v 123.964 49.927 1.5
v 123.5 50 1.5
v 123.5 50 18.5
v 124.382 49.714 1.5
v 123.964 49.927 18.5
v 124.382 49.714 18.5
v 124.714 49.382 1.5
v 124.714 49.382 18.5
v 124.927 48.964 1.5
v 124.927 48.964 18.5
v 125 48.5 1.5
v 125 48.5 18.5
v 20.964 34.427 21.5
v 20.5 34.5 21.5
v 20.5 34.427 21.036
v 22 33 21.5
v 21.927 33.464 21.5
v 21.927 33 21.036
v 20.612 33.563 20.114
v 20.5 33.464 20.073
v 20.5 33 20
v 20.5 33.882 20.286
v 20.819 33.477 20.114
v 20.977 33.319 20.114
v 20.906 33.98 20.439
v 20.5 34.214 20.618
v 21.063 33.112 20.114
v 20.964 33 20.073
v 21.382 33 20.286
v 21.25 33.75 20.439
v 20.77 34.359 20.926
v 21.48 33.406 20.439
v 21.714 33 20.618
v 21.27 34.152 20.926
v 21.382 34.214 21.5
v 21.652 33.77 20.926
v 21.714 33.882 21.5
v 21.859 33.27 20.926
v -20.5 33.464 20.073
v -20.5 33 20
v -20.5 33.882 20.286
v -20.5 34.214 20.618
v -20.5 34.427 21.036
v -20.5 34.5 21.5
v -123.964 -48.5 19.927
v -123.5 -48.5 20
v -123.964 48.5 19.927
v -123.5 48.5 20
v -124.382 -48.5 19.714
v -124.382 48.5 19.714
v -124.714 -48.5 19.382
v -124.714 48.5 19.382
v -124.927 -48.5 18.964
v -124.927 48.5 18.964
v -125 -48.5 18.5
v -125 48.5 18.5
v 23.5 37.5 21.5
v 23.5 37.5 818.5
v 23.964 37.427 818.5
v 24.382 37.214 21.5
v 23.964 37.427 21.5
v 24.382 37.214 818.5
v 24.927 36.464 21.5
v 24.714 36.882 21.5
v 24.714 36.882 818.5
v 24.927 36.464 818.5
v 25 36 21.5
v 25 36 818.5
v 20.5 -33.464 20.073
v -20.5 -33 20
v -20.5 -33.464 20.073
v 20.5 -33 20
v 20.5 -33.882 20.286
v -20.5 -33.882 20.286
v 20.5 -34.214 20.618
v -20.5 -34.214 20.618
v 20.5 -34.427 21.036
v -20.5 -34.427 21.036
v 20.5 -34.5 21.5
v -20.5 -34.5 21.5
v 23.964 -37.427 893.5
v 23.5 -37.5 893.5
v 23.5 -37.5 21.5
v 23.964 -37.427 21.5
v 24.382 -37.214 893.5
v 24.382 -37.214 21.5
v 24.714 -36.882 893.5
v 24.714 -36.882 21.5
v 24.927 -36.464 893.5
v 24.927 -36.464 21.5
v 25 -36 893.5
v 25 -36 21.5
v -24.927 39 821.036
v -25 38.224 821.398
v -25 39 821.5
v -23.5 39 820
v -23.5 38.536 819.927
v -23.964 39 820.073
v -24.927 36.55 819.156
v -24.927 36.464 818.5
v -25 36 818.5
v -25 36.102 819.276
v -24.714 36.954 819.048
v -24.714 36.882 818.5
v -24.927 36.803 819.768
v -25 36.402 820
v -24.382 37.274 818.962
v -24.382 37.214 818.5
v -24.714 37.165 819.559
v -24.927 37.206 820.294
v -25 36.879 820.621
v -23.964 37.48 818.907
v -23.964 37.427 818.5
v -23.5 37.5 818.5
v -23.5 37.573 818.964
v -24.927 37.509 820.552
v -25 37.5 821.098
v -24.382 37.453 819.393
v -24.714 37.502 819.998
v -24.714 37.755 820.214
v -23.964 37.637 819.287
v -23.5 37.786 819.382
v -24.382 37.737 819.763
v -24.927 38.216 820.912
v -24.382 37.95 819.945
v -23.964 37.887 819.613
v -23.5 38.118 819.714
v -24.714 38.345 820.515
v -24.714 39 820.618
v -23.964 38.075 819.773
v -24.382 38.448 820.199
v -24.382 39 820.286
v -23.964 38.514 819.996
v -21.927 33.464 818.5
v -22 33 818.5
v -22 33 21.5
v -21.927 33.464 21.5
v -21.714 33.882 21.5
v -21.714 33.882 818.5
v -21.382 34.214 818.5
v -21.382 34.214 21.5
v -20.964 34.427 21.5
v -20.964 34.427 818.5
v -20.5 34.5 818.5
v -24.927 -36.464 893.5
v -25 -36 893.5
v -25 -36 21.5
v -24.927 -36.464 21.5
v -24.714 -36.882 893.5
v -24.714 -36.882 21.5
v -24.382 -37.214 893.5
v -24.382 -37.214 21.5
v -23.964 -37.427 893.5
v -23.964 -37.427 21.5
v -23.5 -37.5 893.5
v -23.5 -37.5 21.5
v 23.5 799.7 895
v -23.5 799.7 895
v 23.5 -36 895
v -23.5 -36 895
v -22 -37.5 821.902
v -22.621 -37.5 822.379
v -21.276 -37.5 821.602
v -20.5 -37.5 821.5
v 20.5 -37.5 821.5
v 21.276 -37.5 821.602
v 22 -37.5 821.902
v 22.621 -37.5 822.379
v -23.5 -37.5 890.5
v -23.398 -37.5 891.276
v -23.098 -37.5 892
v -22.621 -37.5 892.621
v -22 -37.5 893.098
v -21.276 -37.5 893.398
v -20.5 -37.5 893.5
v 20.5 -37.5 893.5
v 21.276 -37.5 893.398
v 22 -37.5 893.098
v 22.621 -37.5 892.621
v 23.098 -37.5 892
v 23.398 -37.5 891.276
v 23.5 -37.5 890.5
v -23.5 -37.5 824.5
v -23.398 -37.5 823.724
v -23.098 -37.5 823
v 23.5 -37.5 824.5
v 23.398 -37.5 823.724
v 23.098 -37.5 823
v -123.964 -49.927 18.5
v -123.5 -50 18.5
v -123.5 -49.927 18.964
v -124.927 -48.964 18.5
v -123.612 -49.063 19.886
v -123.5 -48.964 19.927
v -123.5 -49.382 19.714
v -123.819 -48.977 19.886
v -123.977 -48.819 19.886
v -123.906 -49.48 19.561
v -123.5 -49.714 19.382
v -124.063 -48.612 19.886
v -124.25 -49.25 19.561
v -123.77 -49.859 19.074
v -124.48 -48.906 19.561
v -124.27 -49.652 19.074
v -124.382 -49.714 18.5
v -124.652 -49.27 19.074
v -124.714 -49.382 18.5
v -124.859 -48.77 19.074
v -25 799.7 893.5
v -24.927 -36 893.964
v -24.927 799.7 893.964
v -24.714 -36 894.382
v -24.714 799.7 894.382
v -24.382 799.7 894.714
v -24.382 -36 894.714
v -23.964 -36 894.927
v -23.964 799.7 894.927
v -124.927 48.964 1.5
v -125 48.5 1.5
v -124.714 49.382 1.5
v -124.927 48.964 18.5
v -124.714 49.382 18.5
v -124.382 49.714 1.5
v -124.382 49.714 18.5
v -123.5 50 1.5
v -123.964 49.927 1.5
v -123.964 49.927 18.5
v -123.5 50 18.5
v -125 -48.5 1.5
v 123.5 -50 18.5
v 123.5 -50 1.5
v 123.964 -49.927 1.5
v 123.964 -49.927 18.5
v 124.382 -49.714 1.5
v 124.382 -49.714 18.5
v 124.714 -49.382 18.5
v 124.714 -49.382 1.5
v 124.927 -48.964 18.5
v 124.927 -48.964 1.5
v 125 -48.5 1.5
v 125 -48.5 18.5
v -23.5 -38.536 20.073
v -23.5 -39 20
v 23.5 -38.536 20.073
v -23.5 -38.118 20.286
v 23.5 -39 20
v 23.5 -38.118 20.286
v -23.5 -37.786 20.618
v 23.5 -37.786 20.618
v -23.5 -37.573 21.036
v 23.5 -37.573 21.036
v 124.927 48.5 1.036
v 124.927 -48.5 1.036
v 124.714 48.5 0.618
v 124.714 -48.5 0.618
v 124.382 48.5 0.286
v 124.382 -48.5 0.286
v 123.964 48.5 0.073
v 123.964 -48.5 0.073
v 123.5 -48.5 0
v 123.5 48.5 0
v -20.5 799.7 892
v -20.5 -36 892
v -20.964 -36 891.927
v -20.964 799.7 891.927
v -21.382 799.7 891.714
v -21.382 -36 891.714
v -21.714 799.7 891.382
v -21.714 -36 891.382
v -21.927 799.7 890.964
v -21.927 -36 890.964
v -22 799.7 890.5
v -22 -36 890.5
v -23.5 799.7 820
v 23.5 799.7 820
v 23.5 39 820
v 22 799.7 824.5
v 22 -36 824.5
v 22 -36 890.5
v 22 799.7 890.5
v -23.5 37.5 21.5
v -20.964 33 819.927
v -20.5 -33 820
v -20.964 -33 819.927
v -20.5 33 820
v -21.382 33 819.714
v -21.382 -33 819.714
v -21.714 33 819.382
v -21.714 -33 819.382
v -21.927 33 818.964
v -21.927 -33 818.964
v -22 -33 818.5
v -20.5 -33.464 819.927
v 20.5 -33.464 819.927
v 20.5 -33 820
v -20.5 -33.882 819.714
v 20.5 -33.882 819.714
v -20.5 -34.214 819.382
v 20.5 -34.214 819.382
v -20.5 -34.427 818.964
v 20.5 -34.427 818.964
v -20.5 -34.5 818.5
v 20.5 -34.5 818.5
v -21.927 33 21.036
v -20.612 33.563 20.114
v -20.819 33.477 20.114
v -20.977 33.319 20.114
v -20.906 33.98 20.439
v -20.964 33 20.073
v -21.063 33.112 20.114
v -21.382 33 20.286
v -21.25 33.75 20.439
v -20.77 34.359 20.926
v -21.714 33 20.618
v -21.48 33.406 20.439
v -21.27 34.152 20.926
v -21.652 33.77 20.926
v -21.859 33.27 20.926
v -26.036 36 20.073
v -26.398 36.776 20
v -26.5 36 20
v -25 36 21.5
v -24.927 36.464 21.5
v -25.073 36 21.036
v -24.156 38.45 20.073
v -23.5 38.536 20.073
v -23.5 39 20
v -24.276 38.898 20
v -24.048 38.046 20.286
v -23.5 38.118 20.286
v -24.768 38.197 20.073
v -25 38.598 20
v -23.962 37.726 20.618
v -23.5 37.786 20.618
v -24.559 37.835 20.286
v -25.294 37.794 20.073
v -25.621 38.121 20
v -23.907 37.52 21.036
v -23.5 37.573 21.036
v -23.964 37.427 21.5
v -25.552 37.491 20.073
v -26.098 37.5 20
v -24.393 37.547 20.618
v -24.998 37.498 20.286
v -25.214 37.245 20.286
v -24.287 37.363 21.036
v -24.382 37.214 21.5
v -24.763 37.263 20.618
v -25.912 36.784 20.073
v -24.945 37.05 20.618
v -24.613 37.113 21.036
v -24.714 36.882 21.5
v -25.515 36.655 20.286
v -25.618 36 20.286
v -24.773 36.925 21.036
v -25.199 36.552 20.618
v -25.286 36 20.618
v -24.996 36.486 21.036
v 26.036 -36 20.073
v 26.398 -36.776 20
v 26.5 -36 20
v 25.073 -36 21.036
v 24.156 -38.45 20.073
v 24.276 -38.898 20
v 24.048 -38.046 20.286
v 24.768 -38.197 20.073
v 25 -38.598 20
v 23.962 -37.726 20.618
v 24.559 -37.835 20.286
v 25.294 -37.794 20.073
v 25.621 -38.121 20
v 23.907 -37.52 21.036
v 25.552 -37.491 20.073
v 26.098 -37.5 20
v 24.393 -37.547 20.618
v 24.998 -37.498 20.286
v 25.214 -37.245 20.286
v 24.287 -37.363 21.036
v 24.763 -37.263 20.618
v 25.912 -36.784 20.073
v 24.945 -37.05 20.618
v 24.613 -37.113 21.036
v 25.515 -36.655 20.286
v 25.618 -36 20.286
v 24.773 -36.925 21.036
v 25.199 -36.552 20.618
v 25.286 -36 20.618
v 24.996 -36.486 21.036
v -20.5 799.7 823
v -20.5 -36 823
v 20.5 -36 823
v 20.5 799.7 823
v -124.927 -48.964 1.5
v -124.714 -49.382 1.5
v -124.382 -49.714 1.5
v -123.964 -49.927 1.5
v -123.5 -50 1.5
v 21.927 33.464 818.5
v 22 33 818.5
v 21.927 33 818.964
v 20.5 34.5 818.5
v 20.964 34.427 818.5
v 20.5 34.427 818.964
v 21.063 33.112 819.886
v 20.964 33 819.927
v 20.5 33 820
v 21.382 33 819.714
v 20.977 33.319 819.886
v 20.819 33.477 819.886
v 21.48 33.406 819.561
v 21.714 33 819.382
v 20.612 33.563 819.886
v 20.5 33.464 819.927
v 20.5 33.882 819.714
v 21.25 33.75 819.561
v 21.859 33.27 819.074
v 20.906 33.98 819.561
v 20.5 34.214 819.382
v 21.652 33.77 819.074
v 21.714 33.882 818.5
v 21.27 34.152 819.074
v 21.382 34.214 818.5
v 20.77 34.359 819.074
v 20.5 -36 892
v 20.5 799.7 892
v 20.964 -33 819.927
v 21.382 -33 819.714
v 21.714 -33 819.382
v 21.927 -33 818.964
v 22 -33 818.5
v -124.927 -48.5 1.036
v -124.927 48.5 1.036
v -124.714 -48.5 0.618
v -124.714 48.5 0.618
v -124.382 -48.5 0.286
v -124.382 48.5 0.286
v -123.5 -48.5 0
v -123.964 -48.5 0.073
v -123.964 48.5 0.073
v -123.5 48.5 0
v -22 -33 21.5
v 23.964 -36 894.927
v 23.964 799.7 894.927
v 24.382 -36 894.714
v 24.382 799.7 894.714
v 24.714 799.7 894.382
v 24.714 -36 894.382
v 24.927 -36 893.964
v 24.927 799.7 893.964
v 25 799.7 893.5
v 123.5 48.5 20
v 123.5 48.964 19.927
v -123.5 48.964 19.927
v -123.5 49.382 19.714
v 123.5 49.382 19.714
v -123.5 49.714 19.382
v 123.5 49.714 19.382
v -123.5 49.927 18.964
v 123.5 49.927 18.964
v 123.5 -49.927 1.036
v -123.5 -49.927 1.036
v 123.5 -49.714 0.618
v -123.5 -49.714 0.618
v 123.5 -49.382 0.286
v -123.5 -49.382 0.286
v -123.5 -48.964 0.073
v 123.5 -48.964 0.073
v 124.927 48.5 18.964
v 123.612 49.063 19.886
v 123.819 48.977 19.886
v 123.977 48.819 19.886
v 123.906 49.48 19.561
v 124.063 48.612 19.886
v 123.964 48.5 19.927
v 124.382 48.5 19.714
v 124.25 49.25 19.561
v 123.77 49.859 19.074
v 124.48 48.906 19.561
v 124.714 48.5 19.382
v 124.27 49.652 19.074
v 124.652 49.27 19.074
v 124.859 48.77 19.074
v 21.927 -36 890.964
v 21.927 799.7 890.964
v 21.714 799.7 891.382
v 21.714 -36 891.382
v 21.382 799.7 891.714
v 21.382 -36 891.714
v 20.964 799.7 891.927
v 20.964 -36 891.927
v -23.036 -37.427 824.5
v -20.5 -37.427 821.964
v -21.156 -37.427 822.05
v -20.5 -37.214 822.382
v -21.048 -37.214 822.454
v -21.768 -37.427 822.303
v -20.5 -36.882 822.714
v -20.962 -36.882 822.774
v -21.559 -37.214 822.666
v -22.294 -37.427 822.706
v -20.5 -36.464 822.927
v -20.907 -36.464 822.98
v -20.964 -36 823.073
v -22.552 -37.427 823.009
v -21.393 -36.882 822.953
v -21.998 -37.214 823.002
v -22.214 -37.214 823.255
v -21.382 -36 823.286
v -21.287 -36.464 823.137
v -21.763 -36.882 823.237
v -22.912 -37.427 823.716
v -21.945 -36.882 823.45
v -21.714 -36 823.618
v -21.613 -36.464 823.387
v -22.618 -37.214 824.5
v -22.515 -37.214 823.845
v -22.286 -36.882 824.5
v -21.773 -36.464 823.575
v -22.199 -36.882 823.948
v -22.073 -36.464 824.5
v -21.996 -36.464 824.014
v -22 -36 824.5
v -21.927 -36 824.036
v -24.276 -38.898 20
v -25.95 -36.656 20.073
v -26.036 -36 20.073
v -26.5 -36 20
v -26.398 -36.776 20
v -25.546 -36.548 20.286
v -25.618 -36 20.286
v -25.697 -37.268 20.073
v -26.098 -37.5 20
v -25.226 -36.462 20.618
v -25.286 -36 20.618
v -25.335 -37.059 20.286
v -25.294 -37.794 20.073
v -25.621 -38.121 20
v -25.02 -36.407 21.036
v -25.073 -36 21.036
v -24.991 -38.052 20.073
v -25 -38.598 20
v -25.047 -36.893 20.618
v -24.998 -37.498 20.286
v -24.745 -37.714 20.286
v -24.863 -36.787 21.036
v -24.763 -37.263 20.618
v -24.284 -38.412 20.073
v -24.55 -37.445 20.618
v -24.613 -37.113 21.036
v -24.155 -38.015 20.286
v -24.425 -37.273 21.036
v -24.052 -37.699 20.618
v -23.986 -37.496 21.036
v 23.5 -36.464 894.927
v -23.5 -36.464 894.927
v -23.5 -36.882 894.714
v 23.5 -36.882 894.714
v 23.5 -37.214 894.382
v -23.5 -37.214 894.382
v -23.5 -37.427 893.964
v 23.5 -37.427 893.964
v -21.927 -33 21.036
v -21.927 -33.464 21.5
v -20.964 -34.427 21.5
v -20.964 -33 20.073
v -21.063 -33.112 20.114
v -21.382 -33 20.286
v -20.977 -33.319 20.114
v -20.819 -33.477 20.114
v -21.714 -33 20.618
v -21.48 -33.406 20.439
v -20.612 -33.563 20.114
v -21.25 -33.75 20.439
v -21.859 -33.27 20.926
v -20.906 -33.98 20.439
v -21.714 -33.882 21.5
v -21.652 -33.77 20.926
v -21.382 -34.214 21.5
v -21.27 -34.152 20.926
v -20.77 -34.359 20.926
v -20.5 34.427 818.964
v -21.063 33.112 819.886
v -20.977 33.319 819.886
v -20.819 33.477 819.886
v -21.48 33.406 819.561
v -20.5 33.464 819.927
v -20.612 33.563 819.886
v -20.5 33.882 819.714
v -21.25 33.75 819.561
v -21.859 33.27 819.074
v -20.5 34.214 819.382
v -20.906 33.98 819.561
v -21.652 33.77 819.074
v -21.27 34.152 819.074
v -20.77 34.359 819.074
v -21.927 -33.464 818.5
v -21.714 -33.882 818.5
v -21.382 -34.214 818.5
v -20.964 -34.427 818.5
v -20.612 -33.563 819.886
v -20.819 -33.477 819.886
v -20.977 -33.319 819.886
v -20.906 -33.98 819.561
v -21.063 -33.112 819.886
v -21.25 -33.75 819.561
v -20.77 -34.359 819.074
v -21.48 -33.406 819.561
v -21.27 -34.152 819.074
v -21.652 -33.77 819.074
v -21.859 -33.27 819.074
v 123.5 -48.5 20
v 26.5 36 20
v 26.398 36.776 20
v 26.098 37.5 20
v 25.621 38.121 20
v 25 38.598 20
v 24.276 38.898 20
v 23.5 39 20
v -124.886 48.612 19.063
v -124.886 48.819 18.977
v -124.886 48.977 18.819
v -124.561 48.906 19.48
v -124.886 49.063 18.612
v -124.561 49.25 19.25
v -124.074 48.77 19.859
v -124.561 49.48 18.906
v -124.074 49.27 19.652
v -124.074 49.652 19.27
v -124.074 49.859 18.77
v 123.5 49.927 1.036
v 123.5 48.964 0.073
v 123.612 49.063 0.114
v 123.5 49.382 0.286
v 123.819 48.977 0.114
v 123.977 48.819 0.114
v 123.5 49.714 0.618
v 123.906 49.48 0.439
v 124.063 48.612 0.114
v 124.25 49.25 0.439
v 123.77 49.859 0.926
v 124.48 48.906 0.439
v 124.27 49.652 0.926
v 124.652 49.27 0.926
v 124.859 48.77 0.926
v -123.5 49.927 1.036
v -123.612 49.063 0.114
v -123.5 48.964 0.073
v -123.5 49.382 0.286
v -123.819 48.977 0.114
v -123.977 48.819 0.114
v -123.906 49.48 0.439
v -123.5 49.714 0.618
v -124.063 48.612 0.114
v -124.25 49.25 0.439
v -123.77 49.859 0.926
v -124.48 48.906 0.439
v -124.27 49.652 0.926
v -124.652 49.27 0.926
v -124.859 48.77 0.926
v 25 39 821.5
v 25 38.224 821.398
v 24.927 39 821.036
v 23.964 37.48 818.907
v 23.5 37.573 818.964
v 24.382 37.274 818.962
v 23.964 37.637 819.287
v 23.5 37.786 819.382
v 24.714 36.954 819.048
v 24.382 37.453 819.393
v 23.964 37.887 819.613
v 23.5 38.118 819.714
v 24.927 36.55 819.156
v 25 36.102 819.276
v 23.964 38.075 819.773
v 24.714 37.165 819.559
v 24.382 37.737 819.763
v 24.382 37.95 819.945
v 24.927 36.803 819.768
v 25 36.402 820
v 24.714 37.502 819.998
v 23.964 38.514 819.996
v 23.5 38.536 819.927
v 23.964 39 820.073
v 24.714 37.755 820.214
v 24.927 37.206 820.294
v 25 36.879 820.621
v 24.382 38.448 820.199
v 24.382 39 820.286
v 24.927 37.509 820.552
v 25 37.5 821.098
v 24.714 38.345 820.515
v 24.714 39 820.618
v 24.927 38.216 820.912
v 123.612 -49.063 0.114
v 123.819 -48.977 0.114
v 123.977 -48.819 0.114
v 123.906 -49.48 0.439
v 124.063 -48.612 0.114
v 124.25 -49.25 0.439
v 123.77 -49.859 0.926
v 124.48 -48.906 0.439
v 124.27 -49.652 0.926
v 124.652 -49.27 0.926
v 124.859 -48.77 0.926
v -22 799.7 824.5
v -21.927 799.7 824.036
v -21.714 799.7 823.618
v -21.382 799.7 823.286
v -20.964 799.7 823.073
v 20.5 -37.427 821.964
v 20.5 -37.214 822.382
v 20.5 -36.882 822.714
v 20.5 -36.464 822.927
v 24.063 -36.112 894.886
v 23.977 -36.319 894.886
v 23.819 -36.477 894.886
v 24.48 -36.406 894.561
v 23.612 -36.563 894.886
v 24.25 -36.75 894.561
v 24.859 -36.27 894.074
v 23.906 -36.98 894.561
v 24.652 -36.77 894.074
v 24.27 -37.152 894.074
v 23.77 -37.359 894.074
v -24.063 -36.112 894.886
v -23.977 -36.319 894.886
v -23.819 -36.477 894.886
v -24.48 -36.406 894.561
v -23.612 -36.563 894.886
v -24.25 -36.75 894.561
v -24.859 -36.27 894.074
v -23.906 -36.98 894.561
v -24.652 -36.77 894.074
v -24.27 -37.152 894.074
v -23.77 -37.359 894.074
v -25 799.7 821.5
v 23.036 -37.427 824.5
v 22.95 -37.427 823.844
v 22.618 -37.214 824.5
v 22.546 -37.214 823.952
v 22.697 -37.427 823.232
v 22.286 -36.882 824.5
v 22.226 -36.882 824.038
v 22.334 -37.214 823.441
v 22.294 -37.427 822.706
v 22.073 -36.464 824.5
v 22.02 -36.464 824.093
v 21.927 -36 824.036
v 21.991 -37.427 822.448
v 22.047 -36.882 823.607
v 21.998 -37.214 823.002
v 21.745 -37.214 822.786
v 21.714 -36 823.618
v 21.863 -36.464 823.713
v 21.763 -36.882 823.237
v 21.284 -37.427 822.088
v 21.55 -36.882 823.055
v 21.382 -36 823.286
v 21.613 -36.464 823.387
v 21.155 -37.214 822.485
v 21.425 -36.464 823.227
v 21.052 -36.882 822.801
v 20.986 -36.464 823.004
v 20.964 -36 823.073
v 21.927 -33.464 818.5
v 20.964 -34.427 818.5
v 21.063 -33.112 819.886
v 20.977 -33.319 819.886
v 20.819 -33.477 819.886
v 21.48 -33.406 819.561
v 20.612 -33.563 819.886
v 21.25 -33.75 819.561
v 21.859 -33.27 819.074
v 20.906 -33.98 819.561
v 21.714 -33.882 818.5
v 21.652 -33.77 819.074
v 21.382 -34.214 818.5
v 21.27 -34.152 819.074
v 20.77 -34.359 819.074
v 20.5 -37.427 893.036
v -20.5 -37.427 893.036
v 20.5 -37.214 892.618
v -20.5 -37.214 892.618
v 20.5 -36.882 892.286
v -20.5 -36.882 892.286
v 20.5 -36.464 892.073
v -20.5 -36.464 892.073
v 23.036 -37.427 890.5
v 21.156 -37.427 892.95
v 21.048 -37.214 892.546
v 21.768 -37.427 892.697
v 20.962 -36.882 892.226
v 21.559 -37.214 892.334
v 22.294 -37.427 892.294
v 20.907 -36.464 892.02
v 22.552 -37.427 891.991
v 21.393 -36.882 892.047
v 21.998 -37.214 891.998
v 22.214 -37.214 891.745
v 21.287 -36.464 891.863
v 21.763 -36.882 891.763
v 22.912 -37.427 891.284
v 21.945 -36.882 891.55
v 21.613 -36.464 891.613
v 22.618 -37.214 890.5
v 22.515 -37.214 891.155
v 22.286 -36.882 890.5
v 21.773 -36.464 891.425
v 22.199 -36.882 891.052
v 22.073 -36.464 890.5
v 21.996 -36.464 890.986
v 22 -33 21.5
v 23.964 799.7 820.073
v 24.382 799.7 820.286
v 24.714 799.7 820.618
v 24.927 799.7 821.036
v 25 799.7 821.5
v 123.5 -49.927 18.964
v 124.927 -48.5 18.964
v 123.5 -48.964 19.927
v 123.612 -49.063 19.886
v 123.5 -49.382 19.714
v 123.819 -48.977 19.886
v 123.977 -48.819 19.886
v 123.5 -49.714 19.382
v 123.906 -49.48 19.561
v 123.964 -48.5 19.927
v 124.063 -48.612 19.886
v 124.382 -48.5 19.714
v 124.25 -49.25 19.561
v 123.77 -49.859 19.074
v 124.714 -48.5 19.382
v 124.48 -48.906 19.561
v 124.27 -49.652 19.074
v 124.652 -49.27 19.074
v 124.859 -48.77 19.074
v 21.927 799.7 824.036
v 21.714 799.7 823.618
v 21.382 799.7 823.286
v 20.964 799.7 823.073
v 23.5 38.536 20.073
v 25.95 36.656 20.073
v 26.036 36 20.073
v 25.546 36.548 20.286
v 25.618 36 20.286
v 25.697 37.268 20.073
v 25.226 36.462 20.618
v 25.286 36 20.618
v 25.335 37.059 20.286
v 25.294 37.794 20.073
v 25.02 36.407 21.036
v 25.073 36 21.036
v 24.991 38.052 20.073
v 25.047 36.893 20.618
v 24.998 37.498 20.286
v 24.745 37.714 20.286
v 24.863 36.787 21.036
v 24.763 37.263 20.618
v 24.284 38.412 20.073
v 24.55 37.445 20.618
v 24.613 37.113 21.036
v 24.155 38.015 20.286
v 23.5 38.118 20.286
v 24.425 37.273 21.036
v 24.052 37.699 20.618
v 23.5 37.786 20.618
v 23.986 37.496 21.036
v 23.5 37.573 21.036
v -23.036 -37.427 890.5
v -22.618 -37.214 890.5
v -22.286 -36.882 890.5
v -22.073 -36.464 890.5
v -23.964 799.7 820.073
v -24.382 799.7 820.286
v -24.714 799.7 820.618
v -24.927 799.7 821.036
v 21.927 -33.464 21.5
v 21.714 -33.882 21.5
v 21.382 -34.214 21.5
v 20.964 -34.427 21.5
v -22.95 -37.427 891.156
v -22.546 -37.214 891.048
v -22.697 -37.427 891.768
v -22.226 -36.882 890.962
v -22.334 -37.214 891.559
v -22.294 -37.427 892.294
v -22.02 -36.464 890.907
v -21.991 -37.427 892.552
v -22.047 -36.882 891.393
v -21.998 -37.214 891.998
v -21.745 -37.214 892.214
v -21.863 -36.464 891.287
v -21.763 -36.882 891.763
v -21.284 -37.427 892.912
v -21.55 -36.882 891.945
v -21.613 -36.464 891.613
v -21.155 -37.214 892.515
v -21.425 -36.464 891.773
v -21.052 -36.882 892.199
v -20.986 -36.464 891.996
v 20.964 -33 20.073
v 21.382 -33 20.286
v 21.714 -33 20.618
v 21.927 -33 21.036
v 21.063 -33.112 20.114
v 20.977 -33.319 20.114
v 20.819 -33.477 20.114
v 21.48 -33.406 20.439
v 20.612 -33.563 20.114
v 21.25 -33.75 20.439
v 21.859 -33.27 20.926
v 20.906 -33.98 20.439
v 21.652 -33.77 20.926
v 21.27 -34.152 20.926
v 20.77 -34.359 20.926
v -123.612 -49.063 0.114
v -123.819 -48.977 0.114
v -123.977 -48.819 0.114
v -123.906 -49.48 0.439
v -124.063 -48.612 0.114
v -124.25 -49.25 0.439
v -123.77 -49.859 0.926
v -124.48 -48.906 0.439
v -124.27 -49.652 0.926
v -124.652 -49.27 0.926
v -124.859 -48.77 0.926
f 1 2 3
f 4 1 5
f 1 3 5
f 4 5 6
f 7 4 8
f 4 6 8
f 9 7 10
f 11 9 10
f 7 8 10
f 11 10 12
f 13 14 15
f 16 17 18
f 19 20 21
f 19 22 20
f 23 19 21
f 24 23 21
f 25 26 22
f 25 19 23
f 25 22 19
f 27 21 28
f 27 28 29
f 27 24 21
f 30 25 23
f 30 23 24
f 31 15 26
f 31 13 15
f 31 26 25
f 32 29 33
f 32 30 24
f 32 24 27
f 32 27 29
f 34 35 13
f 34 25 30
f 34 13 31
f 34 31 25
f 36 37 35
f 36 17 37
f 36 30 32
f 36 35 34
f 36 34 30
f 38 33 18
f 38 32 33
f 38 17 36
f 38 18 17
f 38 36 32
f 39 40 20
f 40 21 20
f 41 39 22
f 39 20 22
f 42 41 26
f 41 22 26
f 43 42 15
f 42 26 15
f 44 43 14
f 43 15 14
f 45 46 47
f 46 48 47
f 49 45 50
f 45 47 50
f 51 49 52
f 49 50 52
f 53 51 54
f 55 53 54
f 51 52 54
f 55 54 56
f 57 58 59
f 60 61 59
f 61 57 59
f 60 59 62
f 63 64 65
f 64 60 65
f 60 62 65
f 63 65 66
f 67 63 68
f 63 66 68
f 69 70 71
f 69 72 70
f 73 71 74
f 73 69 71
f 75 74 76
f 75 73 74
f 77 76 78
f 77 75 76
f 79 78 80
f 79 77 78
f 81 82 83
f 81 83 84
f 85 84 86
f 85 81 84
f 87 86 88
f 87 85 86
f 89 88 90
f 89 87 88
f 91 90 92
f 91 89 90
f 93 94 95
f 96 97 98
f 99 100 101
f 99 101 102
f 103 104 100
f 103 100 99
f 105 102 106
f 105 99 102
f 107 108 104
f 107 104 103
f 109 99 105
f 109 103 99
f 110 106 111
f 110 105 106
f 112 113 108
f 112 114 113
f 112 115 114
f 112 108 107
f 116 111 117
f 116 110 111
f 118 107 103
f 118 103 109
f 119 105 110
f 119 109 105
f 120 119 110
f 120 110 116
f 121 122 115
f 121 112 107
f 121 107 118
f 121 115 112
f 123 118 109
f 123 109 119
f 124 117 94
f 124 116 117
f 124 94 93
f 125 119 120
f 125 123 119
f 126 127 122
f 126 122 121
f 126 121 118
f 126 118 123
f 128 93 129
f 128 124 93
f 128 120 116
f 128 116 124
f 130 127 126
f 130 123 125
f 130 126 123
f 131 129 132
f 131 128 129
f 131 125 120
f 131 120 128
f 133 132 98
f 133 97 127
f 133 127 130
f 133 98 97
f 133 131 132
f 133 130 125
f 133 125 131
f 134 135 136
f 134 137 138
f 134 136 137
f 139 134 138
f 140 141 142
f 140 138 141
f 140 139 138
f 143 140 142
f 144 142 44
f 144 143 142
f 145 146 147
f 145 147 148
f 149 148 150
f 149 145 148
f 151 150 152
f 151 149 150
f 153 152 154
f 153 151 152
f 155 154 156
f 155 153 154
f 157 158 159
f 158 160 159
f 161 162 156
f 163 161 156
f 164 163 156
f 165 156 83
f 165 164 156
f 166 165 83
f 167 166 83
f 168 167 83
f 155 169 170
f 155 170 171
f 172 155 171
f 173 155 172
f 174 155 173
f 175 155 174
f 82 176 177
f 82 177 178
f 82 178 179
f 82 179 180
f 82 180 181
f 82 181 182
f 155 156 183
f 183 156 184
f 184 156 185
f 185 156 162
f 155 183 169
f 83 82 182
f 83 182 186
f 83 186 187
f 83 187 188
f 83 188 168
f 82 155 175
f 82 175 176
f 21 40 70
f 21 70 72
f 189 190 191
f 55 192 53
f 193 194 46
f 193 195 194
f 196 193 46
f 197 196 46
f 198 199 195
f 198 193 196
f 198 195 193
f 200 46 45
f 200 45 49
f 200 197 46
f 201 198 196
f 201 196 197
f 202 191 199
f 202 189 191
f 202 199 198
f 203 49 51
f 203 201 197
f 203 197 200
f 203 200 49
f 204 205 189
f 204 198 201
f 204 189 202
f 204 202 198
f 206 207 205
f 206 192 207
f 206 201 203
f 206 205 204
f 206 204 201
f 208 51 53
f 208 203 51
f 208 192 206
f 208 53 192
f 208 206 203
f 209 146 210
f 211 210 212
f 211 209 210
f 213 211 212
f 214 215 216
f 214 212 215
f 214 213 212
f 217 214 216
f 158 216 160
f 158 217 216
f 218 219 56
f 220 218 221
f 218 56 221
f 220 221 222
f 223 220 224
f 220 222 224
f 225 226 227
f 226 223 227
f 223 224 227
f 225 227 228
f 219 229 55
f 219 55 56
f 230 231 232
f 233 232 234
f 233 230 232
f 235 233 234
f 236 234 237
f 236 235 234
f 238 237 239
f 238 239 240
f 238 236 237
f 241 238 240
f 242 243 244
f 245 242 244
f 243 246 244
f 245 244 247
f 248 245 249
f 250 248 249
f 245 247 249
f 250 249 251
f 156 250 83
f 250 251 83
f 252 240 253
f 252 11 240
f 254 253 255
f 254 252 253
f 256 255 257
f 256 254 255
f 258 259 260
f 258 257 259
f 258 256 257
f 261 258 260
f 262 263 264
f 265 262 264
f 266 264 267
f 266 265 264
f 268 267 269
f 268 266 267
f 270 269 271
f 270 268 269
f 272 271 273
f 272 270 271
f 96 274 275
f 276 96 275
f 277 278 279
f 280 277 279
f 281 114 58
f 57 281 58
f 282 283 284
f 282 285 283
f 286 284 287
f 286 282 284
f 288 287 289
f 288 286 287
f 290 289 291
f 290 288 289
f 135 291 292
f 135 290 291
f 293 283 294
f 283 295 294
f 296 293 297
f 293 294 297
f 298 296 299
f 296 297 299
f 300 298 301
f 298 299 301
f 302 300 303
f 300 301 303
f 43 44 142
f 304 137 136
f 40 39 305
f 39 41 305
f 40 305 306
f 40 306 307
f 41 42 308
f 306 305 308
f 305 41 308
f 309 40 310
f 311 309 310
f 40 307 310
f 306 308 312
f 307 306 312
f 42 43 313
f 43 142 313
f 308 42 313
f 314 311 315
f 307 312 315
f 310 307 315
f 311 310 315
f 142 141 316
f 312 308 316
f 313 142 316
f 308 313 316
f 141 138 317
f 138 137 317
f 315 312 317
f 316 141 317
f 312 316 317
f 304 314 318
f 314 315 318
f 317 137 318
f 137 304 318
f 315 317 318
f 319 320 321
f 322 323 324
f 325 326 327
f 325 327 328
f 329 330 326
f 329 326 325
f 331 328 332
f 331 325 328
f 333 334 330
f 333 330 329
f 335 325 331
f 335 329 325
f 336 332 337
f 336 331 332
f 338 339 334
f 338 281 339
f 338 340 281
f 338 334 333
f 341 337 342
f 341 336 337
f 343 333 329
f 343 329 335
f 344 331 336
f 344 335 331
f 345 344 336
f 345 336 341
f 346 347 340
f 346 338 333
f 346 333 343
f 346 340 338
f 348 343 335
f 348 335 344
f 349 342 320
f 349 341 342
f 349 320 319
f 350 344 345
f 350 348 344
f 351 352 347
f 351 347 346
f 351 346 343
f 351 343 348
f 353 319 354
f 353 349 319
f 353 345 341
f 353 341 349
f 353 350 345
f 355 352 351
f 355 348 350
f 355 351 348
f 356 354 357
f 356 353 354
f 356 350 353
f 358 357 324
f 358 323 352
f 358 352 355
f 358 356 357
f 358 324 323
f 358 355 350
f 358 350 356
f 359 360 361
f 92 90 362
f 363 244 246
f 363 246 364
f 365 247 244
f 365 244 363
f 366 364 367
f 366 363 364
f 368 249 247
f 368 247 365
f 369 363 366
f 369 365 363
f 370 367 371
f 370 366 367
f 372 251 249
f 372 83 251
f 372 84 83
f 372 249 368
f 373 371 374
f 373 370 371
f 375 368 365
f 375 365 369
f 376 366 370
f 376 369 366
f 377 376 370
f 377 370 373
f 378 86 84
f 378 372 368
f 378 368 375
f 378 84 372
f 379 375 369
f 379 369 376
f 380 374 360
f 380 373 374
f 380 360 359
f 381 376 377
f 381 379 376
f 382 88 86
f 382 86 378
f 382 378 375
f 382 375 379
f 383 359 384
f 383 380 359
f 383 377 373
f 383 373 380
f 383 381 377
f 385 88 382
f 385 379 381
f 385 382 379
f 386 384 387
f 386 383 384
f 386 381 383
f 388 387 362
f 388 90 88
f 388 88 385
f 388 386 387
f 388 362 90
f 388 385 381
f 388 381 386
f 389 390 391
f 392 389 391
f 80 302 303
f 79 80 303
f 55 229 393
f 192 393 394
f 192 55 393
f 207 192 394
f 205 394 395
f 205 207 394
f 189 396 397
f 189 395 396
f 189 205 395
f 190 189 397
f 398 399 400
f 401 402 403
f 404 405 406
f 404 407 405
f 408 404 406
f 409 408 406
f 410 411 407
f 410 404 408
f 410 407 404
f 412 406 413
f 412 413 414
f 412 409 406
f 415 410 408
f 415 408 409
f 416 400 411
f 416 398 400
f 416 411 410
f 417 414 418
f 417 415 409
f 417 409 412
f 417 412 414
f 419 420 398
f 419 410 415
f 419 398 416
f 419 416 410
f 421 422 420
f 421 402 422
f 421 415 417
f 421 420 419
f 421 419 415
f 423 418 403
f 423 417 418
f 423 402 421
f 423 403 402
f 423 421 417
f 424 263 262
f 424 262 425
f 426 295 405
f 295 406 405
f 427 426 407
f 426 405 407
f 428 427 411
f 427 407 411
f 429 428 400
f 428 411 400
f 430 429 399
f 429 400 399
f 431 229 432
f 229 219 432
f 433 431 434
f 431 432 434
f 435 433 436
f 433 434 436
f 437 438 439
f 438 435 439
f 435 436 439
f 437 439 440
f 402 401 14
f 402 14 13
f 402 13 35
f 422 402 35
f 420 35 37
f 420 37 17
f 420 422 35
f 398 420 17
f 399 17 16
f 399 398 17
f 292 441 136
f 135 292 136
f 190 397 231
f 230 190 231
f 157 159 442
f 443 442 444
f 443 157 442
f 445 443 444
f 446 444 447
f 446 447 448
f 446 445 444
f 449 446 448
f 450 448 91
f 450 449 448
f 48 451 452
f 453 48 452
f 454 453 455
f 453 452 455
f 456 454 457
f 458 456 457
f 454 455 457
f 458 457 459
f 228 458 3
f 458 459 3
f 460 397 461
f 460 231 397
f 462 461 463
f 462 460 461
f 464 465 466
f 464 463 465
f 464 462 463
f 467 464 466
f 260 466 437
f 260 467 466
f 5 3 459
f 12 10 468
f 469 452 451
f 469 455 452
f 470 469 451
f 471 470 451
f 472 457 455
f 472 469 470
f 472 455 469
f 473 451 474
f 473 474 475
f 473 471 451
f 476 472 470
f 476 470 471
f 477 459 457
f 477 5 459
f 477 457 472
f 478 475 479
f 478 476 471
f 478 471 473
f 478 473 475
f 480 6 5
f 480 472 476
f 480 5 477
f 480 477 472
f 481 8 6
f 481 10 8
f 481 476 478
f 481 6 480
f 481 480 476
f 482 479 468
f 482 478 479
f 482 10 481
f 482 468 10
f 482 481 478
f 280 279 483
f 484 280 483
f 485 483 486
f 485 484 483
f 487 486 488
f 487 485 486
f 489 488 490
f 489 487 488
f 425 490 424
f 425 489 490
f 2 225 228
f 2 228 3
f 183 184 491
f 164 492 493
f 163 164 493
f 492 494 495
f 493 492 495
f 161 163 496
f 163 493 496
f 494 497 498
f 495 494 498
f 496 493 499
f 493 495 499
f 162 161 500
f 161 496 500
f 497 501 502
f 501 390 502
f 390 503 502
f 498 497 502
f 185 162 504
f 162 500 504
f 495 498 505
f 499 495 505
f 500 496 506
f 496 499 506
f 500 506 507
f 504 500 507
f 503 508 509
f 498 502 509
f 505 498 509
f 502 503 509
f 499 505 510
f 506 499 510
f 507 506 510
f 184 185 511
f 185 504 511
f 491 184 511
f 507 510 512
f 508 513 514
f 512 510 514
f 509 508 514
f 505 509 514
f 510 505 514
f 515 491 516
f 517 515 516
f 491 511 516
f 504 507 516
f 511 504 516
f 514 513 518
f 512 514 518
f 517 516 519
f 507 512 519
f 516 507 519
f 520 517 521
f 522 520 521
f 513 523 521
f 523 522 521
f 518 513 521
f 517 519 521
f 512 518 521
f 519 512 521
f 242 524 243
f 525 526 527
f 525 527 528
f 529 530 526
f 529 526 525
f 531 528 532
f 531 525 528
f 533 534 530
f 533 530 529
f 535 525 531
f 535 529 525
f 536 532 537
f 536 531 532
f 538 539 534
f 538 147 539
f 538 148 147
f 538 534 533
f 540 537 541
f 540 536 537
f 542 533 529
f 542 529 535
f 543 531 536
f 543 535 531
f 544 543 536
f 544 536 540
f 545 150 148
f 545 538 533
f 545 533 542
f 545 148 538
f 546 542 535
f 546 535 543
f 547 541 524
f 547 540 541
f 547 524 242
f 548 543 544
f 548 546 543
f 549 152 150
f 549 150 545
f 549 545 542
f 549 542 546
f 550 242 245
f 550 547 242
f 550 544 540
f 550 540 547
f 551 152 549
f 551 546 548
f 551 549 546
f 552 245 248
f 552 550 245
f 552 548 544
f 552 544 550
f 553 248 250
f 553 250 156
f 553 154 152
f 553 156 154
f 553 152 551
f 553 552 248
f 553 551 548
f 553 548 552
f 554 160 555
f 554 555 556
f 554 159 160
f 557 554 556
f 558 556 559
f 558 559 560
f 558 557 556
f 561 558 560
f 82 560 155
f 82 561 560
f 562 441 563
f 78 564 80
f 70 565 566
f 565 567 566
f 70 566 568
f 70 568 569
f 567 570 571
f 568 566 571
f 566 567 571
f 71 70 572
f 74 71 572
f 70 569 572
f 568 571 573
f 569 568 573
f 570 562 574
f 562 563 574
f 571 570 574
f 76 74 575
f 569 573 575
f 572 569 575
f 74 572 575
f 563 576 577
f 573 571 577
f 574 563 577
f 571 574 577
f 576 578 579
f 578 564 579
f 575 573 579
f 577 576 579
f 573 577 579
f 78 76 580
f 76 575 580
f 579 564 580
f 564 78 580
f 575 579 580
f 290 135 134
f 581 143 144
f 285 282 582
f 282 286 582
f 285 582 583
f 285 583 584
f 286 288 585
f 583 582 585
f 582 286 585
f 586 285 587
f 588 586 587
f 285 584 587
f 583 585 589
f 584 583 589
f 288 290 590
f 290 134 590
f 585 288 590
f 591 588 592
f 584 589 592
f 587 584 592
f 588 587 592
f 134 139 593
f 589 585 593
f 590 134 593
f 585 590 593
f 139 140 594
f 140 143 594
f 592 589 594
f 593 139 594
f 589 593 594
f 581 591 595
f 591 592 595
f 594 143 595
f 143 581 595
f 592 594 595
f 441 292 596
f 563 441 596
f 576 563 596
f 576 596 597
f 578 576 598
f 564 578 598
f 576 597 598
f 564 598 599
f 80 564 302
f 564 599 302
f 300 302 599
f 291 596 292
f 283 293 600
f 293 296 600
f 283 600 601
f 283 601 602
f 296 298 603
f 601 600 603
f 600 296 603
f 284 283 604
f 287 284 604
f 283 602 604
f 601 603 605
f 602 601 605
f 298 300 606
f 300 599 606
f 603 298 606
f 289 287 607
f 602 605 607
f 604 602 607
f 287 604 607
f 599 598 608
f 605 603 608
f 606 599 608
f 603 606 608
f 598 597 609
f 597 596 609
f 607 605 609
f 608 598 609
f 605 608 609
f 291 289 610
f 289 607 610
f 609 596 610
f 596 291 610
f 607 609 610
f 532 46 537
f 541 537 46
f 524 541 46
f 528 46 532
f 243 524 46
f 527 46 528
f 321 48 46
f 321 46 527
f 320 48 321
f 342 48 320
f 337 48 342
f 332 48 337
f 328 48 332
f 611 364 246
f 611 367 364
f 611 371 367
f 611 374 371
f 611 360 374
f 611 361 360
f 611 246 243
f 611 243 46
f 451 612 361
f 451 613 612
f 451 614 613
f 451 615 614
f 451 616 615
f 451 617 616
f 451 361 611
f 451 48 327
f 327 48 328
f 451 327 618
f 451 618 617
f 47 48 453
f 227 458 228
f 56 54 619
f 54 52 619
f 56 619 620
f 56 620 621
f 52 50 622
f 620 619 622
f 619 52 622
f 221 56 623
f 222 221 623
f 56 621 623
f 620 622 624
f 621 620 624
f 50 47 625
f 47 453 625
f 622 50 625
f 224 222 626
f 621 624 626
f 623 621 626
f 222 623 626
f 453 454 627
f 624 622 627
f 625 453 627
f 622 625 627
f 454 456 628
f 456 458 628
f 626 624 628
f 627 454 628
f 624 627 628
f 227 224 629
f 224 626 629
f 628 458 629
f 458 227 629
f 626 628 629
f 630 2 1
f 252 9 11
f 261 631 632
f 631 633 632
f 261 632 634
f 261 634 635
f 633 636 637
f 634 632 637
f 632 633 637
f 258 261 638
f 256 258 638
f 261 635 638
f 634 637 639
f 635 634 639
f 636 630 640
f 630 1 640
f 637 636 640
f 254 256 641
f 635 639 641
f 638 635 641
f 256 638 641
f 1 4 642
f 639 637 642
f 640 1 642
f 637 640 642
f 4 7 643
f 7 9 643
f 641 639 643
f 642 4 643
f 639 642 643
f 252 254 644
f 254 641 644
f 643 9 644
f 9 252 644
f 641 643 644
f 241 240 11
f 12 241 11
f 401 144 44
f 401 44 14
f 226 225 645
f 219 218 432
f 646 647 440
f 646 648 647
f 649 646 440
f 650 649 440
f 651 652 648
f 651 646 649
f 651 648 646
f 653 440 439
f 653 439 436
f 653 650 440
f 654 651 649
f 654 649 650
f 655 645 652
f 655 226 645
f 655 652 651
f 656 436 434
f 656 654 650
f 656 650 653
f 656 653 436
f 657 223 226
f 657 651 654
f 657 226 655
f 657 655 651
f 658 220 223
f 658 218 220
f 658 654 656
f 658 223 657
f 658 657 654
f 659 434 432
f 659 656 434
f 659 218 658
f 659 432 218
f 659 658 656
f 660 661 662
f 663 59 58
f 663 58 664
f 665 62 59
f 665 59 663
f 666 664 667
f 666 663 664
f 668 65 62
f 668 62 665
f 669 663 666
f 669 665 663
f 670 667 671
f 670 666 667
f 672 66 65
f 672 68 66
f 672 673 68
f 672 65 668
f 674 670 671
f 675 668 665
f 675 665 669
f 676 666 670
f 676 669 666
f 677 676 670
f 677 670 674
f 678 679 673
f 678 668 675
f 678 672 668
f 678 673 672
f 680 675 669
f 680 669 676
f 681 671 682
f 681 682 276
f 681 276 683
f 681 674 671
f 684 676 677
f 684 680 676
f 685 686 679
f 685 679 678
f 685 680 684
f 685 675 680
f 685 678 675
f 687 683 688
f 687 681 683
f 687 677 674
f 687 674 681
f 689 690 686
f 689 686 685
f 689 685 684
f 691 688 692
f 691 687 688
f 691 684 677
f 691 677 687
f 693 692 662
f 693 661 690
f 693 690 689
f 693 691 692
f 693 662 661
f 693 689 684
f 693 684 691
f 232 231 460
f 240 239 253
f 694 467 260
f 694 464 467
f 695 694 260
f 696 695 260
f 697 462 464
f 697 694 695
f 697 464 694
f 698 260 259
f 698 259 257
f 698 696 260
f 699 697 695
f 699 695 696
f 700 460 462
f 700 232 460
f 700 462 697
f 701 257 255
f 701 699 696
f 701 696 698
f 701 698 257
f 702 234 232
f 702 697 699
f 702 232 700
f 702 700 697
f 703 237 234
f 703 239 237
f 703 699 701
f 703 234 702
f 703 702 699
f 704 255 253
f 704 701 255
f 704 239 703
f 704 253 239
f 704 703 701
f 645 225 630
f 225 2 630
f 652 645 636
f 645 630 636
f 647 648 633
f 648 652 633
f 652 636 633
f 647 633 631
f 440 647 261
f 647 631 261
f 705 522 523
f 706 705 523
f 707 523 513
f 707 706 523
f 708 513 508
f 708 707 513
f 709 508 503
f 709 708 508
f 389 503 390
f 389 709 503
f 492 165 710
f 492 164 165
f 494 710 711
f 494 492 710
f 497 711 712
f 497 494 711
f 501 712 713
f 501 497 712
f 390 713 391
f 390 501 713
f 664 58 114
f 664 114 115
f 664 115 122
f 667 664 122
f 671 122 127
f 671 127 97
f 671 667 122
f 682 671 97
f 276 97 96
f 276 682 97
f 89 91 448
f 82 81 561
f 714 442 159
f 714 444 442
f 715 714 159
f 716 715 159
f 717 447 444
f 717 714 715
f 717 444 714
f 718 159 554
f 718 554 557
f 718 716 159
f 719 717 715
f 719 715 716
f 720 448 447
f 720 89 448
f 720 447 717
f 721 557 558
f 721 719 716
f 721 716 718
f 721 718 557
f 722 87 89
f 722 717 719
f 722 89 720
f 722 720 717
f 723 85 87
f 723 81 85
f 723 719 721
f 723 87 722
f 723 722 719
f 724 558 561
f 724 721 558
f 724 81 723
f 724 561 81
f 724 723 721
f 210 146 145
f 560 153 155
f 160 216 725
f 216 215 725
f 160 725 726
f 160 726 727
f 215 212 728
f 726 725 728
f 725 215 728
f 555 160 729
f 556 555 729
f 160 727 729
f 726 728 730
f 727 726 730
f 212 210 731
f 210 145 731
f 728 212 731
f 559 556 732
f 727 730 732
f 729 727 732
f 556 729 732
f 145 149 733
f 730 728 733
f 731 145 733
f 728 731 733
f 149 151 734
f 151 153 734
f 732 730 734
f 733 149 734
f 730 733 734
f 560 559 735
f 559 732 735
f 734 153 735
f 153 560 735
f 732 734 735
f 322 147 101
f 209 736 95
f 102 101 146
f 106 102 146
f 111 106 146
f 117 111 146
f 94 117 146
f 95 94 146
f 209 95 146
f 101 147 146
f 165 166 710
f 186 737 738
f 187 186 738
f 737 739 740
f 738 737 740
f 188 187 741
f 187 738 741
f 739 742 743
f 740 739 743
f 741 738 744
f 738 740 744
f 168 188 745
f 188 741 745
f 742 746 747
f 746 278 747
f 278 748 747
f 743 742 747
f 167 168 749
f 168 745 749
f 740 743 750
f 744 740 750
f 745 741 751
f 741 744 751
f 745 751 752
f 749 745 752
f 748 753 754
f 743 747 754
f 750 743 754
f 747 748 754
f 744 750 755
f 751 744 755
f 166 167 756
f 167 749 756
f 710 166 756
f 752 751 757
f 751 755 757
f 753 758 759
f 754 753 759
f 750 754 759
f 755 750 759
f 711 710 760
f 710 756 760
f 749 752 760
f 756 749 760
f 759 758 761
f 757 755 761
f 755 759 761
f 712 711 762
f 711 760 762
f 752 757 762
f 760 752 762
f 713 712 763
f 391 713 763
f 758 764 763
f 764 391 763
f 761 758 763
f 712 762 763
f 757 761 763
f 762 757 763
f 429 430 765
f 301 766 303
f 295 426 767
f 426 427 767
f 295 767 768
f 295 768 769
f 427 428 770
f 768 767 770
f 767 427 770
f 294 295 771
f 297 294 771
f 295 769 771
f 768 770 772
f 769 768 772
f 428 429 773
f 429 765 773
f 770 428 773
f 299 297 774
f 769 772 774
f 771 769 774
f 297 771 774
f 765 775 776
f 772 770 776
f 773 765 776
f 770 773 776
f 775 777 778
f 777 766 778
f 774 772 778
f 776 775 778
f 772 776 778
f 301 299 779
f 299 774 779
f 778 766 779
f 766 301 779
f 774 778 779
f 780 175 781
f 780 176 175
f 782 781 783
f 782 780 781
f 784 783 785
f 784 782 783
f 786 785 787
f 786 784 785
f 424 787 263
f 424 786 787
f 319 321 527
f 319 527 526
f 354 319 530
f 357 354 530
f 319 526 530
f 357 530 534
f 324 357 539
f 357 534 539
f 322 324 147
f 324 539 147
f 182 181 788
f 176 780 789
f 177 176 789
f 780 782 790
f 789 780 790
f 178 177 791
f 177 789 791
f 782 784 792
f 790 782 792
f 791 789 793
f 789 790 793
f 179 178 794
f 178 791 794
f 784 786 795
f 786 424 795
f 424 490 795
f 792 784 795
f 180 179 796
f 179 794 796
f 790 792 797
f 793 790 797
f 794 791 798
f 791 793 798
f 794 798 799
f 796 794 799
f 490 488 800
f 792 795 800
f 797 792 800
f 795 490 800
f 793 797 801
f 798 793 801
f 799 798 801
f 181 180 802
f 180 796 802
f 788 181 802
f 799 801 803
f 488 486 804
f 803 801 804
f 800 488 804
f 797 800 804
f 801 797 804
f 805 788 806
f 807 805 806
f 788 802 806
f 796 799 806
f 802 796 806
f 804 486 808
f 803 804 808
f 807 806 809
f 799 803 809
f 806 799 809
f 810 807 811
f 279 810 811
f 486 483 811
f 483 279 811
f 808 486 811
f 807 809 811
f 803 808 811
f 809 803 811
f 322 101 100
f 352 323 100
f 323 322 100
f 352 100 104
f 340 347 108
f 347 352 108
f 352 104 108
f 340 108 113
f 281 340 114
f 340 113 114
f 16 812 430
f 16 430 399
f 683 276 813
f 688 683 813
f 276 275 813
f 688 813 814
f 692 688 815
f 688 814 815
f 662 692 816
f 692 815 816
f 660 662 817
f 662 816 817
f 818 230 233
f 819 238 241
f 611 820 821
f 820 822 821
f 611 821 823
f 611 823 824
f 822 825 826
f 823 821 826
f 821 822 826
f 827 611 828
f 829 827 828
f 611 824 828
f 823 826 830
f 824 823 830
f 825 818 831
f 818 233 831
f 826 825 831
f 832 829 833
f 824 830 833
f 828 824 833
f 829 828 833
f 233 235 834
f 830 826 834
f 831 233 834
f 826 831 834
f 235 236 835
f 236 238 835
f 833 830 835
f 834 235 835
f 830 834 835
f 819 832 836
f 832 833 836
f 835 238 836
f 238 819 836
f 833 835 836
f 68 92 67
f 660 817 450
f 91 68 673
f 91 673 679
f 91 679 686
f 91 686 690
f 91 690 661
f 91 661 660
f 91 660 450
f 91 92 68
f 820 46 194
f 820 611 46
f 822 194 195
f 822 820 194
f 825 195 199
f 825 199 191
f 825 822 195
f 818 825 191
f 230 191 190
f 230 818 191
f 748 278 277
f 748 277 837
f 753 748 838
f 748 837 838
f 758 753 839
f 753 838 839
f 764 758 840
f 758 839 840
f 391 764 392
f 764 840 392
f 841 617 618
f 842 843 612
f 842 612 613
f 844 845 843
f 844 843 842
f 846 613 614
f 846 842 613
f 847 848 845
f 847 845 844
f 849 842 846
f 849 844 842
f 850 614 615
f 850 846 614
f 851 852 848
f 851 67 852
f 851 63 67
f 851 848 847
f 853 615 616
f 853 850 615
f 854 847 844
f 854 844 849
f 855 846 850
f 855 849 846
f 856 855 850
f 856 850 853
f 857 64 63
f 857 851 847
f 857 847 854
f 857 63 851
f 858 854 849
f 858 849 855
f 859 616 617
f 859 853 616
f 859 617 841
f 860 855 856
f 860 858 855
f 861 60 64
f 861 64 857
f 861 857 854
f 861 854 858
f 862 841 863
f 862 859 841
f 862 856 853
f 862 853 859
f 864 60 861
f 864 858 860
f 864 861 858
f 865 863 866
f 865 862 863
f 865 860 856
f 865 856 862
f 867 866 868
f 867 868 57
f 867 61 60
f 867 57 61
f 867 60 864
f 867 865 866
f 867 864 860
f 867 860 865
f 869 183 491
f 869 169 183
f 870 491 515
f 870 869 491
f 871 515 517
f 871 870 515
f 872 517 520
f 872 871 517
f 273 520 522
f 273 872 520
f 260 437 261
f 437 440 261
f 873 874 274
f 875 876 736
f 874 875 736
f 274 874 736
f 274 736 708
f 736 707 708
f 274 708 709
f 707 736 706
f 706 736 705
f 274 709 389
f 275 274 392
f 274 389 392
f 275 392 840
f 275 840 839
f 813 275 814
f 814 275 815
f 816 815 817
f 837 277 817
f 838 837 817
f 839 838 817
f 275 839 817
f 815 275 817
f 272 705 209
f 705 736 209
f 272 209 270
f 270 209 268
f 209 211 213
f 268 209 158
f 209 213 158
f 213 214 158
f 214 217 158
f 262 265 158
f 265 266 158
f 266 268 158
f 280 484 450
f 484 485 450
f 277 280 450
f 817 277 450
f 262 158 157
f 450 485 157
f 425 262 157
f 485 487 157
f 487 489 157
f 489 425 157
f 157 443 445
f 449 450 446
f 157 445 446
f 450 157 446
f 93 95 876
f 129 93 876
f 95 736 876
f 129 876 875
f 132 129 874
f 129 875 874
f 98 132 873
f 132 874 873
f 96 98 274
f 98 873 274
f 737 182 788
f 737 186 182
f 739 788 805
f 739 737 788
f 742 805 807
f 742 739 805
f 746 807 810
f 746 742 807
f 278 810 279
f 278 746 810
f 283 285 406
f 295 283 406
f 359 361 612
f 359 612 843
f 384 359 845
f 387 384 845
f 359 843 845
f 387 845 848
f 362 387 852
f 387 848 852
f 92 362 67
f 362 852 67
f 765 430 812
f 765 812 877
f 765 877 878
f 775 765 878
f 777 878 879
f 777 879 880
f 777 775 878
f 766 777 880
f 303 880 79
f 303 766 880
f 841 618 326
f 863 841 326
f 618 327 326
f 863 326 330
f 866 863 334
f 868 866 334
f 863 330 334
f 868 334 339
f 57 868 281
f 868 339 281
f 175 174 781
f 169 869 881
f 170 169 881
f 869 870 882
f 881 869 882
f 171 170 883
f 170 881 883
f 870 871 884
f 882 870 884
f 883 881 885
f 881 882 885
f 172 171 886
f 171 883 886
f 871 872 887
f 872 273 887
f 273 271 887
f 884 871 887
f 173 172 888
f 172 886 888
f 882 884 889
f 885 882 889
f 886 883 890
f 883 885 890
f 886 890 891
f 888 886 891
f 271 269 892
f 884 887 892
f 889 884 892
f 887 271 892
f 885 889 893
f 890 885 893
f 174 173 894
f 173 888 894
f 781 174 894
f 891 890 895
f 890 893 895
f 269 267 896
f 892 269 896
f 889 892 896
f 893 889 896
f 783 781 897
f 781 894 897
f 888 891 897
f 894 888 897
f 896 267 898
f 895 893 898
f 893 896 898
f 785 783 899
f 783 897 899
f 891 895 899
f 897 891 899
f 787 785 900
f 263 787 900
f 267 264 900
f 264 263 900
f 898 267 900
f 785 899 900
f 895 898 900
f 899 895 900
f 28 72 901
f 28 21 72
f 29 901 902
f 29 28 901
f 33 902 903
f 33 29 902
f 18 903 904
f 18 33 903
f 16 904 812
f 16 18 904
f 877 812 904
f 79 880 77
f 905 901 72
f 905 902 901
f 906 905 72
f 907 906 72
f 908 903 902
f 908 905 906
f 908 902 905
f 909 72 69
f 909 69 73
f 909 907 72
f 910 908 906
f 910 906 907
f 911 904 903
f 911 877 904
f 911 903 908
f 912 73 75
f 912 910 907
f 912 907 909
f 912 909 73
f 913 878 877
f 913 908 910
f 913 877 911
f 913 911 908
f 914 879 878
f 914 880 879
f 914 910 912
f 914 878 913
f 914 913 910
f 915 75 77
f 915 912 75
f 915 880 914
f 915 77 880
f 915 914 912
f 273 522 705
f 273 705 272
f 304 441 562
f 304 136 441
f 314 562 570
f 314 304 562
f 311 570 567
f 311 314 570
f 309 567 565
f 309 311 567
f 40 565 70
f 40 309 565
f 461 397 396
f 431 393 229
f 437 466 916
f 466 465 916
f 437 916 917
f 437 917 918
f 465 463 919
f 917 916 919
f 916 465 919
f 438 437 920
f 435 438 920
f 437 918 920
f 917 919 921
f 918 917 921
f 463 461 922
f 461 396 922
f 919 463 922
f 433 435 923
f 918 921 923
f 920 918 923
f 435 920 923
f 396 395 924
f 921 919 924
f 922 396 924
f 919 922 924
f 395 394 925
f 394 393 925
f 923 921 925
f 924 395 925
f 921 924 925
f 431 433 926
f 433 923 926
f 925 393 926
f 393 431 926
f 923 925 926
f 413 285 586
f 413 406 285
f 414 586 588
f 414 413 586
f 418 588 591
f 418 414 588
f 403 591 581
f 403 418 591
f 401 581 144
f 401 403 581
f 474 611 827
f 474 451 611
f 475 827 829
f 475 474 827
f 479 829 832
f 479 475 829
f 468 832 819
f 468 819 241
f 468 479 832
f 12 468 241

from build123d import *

# Parameters (mm, degrees)
F0_W     = 250
F0_H     = 100
F1_DEPTH = 20
F2_W     = 50
F2_H     = 75
F2_W_2   = 44
F2_H_2   = 69
F3_DEPTH = 800
F4_W     = 50
F4_H     = 75
F4_W_2   = 44
F4_H_2   = 69
F5_DEPTH = 837.2
F6_F1_R  = 1.5
F6_F2_R  = 1.5
F6_F3_R  = 1.5
F6_F4_R  = 1.4999


# Not quite as in the source:
# - a fillet or chamfer is up to 0.001 mm smaller than in the source, because OpenCascade refuses the exact size


with BuildPart() as f1:
    # F0 (on Top) → F1 (new body)
    with BuildSketch(Plane.XY):
        Rectangle(F0_W, F0_H)
    extrude(amount=F1_DEPTH)

    # F2 (on face) → F3 (join)
    with BuildSketch(Plane.XY.offset(20)):
        Rectangle(F2_W, F2_H)
        Rectangle(F2_W_2, F2_H_2, mode=Mode.SUBTRACT)
    extrude(amount=F3_DEPTH)

    # F4 (on face) → F5 (join)
    with BuildSketch(Plane.XZ.offset(37.5)):
        with Locations((0, 857.5)):
            Rectangle(F4_W, F4_H)
        with Locations((0, 857.5)):
            Rectangle(F4_W_2, F4_H_2, mode=Mode.SUBTRACT)
    extrude(amount=-F5_DEPTH)

    # F6: fillet of radius 1.5 on 44 edges, made by hand

    # F6_f1
    f6_f1_edges = [f1.edges().sort_by_distance(p)[0] for p in [
        (-22, -34.5, 420),
        (22, 34.5, 420),
        (22, -34.5, 420),
        (-22, 34.5, 420),
        (-22, 381.1, 892),
        (22, 381.1, 892),
        (0, 37.5, 820),
        (22, 381.1, 823),
        (-22, 381.1, 823),
        (22, 0, 820),
        (0, -34.5, 820),
        (-22, 0, 820),
        (0, 34.5, 820),
        (0, 34.5, 20),
        (-22, 0, 20),
        (22, 0, 20),
        (0, -34.5, 20),
    ]]
    fillet(f6_f1_edges, radius=F6_F1_R)

    # F6_f2
    f6_f2_edges = [f1.edges().sort_by_distance(p)[0] for p in [
        (-25, -37.5, 457.5),
        (25, 37.5, 419.25),
        (25, -37.5, 457.5),
        (-25, 37.5, 419.25),
        (25, 381.1, 895),
        (-25, 381.1, 895),
        (0, -37.5, 895),
        (125, -50, 10),
        (-125, -50, 10),
        (125, 50, 10),
        (0, -50, 0),
        (0, -50, 20),
        (0, 50, 20),
        (125, 0, 20),
        (-125, 0, 20),
        (-125, 50, 10),
        (0, 50, 0),
        (125, 0, 0),
        (-125, 0, 0),
        (-25, 37.9393398282, 819.5606601718),
        (25, 37.9393398282, 819.5606601718),
    ]]
    fillet(f6_f2_edges, radius=F6_F2_R)

    # F6_f3
    f6_f3_edges = [f1.edges().sort_by_distance(p)[0] for p in [
        (25, 0, 20),
        (-25, 0, 20),
        (0, -37.5, 20),
        (0, 37.5, 20),
        (24.5606601718, 37.0606601718, 20),
        (-24.5606601718, 37.0606601718, 20),
        (-24.5606601718, -37.0606601718, 20),
        (24.5606601718, -37.0606601718, 20),
    ]]
    fillet(f6_f3_edges, radius=F6_F3_R)

    # F6_f4 (radius 1.5 in the source; OpenCascade refuses exactly that, so slightly less here)
    f6_f4_edges = [f1.edges().sort_by_distance(p)[0] for p in [
        (-22, -37.5, 857.5),
        (0, -37.5, 823),
        (0, -37.5, 892),
        (22, -37.5, 857.5),
        (21.5606601718, -37.5, 891.5606601718),
        (21.5606601718, -37.5, 823.4393398282),
        (-21.5606601718, -37.5, 891.5606601718),
        (-21.5606601718, -37.5, 823.4393398282),
    ]]
    fillet(f6_f4_edges, radius=F6_F4_R)


solid = f1.part
